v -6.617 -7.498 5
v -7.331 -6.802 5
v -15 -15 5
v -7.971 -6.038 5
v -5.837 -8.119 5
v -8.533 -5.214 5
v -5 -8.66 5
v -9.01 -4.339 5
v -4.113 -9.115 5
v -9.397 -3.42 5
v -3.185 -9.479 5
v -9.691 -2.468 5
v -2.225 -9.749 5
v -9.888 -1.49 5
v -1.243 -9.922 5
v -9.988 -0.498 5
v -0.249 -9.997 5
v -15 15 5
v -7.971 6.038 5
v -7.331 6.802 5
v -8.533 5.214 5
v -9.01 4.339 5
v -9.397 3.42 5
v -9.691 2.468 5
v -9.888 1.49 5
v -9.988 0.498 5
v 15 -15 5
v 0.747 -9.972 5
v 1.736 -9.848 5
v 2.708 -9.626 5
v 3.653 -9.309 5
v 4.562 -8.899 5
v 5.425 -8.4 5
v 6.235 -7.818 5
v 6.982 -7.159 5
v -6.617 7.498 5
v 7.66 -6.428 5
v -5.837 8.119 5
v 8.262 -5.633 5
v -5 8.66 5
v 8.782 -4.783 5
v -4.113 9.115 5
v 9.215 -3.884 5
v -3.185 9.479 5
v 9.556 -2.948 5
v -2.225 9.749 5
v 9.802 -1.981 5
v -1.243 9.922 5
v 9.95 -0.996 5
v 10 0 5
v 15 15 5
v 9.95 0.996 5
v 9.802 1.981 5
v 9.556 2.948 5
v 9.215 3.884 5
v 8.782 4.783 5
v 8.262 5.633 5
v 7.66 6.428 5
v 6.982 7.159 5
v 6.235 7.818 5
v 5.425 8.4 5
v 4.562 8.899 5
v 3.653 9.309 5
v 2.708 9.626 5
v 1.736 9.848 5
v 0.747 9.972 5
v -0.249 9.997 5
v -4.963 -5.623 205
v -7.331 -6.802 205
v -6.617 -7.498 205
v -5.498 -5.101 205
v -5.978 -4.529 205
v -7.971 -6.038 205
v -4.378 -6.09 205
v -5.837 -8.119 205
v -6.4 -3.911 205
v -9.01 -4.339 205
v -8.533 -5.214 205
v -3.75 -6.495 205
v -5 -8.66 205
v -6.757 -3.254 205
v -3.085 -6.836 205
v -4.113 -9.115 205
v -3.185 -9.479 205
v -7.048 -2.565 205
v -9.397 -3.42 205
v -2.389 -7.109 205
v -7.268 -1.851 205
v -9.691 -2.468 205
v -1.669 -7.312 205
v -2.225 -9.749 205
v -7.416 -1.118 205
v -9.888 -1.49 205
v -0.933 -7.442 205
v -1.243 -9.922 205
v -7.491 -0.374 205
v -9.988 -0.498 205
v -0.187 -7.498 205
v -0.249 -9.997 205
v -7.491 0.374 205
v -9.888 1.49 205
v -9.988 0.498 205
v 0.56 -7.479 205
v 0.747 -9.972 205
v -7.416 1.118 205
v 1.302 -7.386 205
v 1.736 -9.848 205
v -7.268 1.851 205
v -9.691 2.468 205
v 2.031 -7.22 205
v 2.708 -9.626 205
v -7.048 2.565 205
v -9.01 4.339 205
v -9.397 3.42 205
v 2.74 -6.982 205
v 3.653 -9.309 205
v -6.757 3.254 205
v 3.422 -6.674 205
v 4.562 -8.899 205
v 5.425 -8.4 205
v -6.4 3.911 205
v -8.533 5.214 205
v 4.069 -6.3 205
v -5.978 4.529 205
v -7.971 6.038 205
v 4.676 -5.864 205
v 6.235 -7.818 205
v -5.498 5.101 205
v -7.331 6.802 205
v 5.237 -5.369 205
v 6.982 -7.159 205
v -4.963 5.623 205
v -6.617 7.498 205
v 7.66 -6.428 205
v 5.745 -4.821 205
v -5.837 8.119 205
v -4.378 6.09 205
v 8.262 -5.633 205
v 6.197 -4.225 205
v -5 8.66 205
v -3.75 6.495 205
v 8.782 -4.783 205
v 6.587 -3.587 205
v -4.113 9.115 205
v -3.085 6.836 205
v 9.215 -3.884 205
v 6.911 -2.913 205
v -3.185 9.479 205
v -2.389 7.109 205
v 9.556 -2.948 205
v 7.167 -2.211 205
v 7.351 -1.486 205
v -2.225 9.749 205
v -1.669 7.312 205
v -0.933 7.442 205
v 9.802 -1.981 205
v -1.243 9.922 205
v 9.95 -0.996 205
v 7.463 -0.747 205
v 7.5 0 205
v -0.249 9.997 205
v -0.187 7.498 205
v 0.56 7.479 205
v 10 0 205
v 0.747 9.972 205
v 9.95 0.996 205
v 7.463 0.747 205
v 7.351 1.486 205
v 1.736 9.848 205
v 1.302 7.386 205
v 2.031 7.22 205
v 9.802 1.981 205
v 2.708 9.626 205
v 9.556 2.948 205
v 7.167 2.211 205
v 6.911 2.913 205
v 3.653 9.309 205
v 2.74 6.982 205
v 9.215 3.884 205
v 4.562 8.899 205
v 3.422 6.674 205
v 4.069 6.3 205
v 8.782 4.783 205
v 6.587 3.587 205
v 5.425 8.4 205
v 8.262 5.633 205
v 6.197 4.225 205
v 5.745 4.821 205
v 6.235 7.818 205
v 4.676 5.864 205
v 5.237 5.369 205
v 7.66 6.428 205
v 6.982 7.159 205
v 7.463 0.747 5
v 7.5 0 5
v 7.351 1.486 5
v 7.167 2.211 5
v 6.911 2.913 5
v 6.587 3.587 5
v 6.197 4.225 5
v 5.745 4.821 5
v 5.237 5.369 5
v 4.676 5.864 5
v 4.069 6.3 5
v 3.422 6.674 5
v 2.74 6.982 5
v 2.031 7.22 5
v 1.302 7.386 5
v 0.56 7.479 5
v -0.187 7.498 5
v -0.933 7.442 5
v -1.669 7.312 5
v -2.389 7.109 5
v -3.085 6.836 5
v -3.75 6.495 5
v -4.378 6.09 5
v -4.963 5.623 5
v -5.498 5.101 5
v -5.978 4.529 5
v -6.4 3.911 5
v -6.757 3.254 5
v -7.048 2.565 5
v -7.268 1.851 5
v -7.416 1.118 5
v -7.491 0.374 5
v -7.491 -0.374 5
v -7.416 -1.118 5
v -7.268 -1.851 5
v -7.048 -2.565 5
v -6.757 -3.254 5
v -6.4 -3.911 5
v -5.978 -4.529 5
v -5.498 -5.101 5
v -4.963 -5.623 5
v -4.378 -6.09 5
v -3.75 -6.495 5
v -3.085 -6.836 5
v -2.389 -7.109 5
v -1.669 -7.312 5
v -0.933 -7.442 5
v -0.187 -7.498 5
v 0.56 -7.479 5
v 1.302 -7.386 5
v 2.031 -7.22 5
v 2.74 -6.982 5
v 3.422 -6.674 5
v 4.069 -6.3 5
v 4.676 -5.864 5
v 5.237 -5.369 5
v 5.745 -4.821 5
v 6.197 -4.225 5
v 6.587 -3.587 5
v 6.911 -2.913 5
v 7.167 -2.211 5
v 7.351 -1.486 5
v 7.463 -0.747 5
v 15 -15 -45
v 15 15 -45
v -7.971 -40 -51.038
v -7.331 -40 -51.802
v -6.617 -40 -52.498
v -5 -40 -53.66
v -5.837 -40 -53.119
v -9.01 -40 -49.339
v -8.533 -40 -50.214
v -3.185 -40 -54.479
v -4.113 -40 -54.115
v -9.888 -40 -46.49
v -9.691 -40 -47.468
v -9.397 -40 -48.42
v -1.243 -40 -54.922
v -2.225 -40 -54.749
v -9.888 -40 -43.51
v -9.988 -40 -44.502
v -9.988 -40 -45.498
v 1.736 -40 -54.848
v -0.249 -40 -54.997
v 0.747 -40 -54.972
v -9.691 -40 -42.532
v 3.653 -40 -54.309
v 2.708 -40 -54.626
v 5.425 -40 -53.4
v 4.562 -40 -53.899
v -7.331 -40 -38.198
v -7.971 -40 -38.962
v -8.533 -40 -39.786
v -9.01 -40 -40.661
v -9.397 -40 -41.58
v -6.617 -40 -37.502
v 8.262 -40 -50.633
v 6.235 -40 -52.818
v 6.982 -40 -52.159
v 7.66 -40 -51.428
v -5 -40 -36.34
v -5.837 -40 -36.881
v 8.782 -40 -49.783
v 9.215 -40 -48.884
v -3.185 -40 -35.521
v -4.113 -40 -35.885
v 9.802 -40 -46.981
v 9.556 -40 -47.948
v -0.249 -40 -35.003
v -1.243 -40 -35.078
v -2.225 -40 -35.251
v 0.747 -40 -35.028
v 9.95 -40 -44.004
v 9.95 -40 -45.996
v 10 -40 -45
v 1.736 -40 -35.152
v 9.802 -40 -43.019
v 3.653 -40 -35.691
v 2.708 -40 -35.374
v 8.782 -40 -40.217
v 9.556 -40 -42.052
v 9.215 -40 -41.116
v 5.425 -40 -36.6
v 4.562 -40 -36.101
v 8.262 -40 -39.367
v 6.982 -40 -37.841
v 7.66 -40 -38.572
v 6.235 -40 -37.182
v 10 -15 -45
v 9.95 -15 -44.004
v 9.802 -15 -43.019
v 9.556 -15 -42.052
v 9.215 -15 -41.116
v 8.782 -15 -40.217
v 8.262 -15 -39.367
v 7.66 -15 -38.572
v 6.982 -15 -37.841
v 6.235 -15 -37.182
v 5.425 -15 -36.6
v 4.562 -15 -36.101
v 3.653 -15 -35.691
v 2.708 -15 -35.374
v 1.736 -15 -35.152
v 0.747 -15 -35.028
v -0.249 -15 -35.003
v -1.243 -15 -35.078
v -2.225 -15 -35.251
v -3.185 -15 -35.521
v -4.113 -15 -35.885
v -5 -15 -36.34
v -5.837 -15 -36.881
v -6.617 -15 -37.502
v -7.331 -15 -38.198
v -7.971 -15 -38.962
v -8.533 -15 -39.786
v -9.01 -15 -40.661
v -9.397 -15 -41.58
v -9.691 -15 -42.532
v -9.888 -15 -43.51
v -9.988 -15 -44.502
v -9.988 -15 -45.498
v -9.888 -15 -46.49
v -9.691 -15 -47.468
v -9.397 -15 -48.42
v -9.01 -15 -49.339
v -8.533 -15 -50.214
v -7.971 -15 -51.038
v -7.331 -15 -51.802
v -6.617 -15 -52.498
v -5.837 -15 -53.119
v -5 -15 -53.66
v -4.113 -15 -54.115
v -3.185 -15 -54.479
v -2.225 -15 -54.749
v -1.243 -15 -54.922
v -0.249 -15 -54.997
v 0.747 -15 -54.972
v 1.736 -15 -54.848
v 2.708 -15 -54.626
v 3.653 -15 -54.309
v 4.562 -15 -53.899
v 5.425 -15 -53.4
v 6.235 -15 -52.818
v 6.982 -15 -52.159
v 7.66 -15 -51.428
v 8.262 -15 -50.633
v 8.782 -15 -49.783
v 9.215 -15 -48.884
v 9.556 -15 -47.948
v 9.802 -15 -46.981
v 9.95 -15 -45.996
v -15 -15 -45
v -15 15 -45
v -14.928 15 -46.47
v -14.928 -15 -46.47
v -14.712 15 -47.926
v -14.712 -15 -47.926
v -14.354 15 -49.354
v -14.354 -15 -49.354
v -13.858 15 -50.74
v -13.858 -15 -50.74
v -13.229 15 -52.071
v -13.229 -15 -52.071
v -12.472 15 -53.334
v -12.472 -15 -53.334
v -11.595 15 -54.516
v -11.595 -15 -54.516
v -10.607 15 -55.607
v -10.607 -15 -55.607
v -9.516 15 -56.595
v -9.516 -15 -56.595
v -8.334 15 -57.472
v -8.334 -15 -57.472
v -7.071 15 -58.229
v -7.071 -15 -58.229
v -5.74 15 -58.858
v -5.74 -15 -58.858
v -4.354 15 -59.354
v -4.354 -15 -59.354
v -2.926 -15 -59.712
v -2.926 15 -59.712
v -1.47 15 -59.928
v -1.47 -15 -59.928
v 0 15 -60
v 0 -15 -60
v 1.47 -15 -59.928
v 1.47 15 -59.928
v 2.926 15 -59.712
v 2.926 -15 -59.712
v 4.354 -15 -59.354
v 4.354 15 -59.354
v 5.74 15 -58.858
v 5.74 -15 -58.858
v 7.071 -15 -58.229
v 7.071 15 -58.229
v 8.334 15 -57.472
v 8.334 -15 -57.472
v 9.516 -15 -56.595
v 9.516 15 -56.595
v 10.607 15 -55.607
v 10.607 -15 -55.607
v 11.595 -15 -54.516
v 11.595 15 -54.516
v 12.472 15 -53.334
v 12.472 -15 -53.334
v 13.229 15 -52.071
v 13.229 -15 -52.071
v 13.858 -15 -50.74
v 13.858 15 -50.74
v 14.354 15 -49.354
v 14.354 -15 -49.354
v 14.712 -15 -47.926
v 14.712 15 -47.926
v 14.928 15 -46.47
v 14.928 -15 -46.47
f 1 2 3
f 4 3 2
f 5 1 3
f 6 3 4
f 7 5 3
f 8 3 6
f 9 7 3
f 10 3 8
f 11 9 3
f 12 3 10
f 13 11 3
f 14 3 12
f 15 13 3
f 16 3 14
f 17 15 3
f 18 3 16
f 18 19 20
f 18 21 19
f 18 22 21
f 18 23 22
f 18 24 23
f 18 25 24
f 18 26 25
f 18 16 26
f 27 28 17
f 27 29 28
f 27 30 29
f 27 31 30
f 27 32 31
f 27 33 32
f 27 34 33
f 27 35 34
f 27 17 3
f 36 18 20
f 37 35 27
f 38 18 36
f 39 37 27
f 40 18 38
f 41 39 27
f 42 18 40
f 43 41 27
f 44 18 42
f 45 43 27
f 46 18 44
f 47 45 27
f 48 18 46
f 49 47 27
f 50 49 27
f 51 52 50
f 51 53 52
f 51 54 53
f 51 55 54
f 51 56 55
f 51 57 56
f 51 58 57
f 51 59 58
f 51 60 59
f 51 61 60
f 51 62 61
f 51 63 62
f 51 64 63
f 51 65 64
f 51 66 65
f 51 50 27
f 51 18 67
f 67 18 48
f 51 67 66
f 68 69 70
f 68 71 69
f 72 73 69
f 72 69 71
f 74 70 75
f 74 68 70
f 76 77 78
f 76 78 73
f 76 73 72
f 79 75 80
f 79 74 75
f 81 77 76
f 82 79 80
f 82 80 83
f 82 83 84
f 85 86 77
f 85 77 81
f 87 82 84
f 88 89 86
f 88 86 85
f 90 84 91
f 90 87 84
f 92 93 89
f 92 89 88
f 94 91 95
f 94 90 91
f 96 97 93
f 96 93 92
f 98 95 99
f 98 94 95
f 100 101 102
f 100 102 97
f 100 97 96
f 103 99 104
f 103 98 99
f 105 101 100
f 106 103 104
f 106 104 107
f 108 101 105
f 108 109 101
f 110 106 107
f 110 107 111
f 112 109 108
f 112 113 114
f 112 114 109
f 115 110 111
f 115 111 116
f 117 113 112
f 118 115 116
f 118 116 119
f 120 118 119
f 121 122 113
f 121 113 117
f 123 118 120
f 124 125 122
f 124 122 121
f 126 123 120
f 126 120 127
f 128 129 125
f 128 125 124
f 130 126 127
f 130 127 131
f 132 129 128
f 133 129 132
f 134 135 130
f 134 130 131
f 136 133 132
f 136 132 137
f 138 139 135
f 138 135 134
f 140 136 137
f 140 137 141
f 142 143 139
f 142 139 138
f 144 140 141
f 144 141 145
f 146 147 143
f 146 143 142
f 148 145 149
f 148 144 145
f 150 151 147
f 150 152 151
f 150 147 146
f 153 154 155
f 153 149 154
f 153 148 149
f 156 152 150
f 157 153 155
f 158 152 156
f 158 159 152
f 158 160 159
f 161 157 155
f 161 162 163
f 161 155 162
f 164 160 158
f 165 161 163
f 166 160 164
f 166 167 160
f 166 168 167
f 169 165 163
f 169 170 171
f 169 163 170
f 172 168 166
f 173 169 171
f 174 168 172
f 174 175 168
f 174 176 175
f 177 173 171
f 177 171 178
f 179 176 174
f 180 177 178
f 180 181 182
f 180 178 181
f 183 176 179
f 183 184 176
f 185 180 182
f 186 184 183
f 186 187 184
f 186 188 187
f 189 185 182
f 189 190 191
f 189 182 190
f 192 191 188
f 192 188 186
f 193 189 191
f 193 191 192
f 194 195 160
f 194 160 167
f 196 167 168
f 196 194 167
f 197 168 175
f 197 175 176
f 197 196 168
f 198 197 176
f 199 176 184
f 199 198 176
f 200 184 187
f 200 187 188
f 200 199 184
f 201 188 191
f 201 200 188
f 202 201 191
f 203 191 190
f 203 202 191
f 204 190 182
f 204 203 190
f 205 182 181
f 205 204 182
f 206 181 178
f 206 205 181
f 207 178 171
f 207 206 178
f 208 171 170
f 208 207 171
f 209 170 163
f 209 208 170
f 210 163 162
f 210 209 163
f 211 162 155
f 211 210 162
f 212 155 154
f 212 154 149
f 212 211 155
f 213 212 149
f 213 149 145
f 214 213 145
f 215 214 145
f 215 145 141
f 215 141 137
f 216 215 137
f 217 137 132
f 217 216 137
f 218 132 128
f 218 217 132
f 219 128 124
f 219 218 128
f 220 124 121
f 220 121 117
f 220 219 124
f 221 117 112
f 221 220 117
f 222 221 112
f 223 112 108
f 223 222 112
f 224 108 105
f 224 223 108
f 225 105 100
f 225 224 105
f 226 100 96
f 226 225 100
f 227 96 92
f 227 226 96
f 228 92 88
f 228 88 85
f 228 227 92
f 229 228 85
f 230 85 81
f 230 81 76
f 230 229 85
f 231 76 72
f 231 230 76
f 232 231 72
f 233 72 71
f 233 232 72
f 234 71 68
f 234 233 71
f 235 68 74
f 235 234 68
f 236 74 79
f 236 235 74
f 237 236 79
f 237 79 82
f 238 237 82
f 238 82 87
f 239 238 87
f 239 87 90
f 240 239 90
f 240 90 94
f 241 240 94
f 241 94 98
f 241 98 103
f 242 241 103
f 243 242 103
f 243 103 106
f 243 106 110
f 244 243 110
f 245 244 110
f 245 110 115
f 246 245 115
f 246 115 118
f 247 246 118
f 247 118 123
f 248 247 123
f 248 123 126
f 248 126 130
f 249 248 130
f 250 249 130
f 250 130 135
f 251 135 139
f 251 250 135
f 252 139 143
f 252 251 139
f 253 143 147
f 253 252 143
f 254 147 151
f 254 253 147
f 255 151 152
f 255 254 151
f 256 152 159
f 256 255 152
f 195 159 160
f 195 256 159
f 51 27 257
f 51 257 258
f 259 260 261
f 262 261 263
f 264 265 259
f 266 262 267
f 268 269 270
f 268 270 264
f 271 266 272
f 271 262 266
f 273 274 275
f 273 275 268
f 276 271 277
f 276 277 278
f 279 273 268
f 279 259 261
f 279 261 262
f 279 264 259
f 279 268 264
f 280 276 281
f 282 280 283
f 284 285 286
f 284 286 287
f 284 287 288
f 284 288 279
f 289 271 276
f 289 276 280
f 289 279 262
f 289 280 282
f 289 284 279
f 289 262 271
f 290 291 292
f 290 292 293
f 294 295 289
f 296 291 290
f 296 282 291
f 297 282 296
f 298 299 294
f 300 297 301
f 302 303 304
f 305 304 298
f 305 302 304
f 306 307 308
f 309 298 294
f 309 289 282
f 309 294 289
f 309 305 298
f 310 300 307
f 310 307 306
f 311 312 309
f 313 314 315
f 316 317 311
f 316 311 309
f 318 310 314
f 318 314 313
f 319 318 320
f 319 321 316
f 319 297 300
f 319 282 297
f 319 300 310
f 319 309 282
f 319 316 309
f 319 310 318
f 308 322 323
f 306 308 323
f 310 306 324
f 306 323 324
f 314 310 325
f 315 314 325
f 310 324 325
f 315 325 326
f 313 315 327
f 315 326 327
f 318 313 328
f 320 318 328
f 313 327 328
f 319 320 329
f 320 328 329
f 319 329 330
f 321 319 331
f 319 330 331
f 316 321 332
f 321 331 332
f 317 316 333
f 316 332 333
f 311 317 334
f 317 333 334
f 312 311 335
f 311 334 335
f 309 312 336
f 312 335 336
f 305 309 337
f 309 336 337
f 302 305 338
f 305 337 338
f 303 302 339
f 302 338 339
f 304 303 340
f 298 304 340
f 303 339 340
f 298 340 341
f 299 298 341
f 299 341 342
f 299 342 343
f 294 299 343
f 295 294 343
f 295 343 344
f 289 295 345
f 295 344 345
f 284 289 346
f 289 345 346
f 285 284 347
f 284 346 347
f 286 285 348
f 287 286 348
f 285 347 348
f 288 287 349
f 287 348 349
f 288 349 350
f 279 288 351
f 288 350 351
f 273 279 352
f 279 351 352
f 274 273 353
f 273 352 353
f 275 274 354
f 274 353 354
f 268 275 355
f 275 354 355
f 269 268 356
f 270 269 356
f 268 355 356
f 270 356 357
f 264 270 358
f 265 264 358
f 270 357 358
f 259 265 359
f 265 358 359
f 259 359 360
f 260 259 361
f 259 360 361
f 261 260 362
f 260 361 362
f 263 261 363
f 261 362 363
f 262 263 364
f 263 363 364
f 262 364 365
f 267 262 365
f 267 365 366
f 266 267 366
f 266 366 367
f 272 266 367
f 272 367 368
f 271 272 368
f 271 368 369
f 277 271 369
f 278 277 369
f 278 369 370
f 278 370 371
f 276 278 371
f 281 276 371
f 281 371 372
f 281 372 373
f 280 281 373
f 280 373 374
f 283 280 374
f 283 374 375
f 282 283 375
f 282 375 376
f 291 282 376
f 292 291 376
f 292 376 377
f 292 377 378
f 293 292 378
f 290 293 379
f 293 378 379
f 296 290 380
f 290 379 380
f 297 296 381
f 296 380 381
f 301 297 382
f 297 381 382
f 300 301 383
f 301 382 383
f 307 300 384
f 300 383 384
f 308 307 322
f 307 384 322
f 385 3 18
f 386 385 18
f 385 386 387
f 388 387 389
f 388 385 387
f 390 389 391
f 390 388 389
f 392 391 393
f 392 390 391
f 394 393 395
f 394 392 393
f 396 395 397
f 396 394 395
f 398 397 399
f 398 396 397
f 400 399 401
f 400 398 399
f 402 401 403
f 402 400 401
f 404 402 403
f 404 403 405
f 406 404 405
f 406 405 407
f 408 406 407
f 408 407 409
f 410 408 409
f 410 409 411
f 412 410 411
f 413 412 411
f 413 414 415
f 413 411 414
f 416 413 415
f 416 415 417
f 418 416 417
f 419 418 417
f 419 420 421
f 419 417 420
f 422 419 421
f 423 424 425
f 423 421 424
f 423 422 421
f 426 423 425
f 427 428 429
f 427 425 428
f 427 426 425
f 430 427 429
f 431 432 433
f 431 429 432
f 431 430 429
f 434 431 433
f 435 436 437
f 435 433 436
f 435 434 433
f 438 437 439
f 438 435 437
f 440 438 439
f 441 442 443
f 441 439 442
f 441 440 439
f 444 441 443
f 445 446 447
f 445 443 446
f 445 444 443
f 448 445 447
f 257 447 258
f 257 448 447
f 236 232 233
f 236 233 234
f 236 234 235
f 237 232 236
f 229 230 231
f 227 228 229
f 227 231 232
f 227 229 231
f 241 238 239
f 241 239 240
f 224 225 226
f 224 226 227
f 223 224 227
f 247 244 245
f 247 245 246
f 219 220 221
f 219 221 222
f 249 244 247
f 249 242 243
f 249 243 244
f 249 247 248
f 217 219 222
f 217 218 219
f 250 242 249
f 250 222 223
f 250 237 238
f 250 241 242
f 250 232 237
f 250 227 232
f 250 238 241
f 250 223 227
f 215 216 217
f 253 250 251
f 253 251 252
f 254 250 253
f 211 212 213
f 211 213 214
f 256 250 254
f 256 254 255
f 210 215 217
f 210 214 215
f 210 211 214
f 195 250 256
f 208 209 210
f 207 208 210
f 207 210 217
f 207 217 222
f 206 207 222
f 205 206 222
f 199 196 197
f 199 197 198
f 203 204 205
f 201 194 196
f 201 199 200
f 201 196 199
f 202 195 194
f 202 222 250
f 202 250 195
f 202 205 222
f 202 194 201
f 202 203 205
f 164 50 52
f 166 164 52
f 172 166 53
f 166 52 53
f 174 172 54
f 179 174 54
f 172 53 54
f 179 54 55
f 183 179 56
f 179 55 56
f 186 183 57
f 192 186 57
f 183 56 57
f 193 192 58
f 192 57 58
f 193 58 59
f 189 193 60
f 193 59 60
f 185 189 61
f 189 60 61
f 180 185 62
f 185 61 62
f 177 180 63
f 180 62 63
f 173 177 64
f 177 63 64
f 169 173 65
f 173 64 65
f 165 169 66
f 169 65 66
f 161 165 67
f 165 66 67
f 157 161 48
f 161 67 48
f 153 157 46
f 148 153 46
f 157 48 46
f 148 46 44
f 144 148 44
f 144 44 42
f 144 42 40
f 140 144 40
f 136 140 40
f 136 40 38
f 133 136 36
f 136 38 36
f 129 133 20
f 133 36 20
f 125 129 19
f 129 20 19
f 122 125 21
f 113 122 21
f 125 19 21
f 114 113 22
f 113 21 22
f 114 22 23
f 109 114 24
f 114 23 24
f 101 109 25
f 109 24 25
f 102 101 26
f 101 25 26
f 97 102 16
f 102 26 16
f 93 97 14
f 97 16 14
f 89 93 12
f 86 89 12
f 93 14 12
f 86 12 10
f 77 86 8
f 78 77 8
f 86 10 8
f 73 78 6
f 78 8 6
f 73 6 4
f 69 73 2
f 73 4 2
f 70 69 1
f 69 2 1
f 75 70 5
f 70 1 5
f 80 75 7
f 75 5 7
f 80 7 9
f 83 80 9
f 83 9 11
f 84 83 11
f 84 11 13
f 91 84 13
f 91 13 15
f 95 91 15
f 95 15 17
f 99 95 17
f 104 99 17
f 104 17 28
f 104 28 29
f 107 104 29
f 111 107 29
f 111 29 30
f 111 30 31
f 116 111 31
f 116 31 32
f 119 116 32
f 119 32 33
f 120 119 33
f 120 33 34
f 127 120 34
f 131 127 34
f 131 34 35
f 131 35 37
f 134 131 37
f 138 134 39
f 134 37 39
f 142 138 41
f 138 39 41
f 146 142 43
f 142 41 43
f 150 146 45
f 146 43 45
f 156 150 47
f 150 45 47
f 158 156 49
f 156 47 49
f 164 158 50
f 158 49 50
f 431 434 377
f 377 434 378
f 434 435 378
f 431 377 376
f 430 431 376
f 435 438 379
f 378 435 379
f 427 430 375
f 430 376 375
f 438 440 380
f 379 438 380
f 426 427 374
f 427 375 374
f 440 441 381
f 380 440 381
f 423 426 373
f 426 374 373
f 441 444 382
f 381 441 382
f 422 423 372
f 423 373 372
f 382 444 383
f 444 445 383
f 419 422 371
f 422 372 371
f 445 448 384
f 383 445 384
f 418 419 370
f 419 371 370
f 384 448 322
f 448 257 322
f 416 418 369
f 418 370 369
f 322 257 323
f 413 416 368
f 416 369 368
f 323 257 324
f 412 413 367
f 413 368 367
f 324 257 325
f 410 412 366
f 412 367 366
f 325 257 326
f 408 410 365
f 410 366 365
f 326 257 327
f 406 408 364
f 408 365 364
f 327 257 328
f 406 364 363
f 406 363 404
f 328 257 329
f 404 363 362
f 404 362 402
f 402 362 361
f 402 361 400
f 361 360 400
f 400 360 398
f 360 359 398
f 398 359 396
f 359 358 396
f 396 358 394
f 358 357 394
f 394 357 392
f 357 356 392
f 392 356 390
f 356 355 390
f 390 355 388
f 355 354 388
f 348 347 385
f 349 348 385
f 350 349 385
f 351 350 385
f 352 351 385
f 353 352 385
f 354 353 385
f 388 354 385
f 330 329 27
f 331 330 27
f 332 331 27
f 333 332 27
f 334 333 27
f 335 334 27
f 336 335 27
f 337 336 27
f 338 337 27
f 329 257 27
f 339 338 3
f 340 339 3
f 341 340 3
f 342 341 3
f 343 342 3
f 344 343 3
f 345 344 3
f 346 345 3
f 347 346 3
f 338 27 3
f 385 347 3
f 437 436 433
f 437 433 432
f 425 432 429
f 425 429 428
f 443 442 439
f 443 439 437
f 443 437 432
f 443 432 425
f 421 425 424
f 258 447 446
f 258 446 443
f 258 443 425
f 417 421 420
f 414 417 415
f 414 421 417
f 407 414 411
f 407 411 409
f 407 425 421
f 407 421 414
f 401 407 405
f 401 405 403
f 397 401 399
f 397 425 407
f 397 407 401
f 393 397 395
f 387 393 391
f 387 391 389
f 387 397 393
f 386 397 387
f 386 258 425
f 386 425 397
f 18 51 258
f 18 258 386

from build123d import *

# Parameters (mm, degrees)
SKETCH_1_W          = 30
SKETCH_1_H          = 30
EXTRUDE_1_DEPTH     = 5
SKETCH_2_R          = 10
SKETCH_2_R_2        = 7.5
EXTRUDE_2_DEPTH     = 200
SKETCH_3_W          = 30
SKETCH_3_H          = 30
EXTRUDE_3_DEPTH     = 60
SKETCH_4_R          = 10
EXTRUDE_4_DEPTH     = 25
CUT_EXTRUDE_1_DEPTH = 31


with BuildPart() as part:
    # 草图1 → 凸台-拉伸1 (new body)
    with BuildSketch(Plane.XY):
        Rectangle(SKETCH_1_W, SKETCH_1_H)
    extrude(amount=EXTRUDE_1_DEPTH)

    # 草图2 → 凸台-拉伸2 (add)
    with BuildSketch(Plane.XY.offset(5)):
        Circle(SKETCH_2_R)
        Circle(SKETCH_2_R_2, mode=Mode.SUBTRACT)
    extrude(amount=EXTRUDE_2_DEPTH)

    # 草图3 → 凸台-拉伸3 (add)
    with BuildSketch(Plane(origin=(0, 0, 0), x_dir=(-1, 0, 0), z_dir=(0, 0, -1))):
        Rectangle(SKETCH_3_W, SKETCH_3_H)
    extrude(amount=EXTRUDE_3_DEPTH)

    # 草图4 → 凸台-拉伸4 (add)
    with BuildSketch(Plane.XZ.offset(15)):
        with Locations((0, -45)):
            Circle(SKETCH_4_R)
    extrude(amount=EXTRUDE_4_DEPTH)

    # 草图5 → 切除-拉伸1 (cut, through all)
    with BuildSketch(Plane.XZ.offset(15)):
        with BuildLine():
            Line((15, -45), (15, -76.870462398))
            Line((15, -76.870462398), (-15, -76.870462398))
            Line((-15, -76.870462398), (-15, -45))
            ThreePointArc((-15, -45), (0, -60), (15, -45))
        make_face()
    extrude(amount=-CUT_EXTRUDE_1_DEPTH, mode=Mode.SUBTRACT)


solid = part.part
